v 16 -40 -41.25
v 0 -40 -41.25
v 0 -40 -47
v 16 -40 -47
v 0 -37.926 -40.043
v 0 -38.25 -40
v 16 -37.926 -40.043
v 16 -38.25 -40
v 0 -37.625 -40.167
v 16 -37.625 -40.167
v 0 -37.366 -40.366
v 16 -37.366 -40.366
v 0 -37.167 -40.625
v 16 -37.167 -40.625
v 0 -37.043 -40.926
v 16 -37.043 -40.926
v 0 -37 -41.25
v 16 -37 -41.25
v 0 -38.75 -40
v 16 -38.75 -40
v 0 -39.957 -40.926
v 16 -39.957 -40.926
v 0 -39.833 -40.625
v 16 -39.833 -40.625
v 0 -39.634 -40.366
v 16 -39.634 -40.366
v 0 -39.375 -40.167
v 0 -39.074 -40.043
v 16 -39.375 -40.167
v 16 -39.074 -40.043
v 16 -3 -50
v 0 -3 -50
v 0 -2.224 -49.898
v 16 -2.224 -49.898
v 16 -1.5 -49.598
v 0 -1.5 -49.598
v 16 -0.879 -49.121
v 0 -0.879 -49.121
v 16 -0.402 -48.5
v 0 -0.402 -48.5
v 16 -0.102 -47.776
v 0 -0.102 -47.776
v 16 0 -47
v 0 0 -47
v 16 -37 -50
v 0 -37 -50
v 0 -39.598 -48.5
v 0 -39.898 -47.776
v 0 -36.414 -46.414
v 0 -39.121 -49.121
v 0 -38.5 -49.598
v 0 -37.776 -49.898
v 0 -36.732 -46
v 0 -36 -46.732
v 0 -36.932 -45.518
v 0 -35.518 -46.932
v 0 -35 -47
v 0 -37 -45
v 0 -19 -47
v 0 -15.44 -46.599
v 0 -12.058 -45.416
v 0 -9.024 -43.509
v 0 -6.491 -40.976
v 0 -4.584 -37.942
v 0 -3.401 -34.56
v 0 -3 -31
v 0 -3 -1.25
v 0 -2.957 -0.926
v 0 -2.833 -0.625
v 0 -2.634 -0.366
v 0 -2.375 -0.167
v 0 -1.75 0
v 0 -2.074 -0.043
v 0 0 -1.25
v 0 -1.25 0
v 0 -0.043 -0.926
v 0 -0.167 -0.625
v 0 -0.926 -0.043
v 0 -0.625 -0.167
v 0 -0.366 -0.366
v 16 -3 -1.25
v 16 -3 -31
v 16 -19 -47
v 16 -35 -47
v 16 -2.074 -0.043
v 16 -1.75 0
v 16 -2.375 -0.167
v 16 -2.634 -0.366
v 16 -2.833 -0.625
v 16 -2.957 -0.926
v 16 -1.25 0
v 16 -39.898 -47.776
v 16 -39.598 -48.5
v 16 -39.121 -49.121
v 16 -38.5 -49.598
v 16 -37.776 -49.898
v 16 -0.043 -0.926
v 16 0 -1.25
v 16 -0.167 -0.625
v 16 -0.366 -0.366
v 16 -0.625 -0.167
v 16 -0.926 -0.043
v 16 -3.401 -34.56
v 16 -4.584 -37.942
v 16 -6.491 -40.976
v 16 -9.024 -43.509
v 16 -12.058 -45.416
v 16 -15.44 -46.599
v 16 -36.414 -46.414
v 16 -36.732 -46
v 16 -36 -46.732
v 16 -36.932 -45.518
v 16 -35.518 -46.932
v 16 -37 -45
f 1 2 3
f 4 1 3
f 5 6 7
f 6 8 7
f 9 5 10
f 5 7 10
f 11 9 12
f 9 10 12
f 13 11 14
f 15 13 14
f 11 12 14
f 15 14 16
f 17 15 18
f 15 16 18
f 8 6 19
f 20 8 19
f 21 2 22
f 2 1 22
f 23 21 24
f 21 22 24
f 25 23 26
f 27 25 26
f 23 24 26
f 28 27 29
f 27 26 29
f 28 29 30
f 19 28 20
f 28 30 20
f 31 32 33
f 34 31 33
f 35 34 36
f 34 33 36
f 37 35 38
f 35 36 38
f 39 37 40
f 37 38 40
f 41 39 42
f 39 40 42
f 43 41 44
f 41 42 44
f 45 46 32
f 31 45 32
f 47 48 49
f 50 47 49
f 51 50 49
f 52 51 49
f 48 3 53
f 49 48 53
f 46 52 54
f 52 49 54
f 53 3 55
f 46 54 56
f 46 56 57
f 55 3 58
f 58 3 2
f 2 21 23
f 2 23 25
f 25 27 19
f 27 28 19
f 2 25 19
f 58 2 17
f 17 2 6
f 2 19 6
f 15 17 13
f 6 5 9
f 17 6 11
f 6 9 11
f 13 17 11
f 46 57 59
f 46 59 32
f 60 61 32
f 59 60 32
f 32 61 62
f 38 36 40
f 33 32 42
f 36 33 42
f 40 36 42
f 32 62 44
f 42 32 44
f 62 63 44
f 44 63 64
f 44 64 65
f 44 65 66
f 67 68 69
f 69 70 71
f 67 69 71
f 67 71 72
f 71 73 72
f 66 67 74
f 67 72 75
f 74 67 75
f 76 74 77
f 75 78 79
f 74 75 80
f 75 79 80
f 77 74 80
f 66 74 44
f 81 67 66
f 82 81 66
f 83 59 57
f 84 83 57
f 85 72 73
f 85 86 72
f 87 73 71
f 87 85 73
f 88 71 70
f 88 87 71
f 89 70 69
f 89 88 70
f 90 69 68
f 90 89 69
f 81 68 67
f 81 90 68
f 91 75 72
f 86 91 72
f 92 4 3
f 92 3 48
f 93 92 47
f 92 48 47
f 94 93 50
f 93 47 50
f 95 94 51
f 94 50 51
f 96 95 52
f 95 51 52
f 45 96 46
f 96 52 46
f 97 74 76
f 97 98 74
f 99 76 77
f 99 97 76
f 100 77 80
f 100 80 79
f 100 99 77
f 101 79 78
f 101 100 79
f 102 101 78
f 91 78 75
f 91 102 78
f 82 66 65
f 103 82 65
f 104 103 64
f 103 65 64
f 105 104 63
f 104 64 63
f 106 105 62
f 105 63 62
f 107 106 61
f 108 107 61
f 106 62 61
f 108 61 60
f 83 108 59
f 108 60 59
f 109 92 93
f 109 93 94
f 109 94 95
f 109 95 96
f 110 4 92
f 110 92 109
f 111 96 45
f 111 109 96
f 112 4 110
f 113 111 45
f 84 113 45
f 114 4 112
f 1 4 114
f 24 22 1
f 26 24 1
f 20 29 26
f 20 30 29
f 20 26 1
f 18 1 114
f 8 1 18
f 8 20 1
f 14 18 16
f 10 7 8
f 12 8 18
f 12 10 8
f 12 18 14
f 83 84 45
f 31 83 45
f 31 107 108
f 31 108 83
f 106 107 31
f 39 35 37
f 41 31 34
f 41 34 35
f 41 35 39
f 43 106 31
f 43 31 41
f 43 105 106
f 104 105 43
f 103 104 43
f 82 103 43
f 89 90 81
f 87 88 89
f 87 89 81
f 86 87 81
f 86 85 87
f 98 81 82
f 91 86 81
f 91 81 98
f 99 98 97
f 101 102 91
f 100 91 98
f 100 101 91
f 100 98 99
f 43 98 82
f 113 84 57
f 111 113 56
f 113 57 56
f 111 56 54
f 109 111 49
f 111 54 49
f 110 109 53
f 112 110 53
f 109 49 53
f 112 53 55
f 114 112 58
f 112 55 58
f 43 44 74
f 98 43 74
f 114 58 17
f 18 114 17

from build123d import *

# Parameters (mm, degrees)
F1_DEPTH = 16
F2_R     = 1.25
F3_R     = 1.25


with BuildPart() as f1:
    # F0 (on Right) → F1 (new body)
    with BuildSketch(Plane.YZ):
        with BuildLine():
            Line((0, -47), (0, 0))
            Line((0, 0), (-3, 0))
            Line((-3, 0), (-3, -31))
            ThreePointArc((-3, -31), (-7.686292, -42.313708), (-19, -47))
            Line((-19, -47), (-35, -47))
            ThreePointArc((-35, -47), (-36.414214, -46.414214), (-37, -45))
            Line((-37, -45), (-37, -40))
            Line((-37, -40), (-40, -40))
            Line((-40, -40), (-40, -47))
            ThreePointArc((-40, -47), (-39.12132, -49.12132), (-37, -50))
            Line((-37, -50), (-3, -50))
            ThreePointArc((-3, -50), (-0.87868, -49.12132), (0, -47))
        make_face()
    extrude(amount=F1_DEPTH)

    # F2
    f2_edges = [f1.edges().sort_by_distance(p)[0] for p in [
        (8, 0, 0),
        (8, -3, 0),
    ]]
    fillet(f2_edges, radius=F2_R)

    # F3
    f3_edges = [f1.edges().sort_by_distance(p)[0] for p in [
        (8, -37, -40),
        (8, -40, -40),
    ]]
    fillet(f3_edges, radius=F3_R)


solid = f1.part
